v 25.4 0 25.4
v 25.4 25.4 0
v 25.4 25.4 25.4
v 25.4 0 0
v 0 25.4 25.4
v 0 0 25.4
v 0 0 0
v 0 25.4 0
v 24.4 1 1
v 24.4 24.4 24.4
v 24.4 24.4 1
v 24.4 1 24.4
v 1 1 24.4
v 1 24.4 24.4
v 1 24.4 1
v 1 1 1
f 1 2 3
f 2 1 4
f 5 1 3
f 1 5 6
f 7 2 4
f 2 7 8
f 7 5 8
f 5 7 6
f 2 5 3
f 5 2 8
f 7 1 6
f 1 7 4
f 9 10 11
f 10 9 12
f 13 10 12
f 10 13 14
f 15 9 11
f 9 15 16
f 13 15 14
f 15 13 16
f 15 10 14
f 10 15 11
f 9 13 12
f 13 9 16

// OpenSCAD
difference() {
	cube(size = [25.4, 25.4, 25.4]);
	translate(v = [1, 1, 1]) {
		cube(size = [23.4, 23.4, 23.4]);
	}
}
